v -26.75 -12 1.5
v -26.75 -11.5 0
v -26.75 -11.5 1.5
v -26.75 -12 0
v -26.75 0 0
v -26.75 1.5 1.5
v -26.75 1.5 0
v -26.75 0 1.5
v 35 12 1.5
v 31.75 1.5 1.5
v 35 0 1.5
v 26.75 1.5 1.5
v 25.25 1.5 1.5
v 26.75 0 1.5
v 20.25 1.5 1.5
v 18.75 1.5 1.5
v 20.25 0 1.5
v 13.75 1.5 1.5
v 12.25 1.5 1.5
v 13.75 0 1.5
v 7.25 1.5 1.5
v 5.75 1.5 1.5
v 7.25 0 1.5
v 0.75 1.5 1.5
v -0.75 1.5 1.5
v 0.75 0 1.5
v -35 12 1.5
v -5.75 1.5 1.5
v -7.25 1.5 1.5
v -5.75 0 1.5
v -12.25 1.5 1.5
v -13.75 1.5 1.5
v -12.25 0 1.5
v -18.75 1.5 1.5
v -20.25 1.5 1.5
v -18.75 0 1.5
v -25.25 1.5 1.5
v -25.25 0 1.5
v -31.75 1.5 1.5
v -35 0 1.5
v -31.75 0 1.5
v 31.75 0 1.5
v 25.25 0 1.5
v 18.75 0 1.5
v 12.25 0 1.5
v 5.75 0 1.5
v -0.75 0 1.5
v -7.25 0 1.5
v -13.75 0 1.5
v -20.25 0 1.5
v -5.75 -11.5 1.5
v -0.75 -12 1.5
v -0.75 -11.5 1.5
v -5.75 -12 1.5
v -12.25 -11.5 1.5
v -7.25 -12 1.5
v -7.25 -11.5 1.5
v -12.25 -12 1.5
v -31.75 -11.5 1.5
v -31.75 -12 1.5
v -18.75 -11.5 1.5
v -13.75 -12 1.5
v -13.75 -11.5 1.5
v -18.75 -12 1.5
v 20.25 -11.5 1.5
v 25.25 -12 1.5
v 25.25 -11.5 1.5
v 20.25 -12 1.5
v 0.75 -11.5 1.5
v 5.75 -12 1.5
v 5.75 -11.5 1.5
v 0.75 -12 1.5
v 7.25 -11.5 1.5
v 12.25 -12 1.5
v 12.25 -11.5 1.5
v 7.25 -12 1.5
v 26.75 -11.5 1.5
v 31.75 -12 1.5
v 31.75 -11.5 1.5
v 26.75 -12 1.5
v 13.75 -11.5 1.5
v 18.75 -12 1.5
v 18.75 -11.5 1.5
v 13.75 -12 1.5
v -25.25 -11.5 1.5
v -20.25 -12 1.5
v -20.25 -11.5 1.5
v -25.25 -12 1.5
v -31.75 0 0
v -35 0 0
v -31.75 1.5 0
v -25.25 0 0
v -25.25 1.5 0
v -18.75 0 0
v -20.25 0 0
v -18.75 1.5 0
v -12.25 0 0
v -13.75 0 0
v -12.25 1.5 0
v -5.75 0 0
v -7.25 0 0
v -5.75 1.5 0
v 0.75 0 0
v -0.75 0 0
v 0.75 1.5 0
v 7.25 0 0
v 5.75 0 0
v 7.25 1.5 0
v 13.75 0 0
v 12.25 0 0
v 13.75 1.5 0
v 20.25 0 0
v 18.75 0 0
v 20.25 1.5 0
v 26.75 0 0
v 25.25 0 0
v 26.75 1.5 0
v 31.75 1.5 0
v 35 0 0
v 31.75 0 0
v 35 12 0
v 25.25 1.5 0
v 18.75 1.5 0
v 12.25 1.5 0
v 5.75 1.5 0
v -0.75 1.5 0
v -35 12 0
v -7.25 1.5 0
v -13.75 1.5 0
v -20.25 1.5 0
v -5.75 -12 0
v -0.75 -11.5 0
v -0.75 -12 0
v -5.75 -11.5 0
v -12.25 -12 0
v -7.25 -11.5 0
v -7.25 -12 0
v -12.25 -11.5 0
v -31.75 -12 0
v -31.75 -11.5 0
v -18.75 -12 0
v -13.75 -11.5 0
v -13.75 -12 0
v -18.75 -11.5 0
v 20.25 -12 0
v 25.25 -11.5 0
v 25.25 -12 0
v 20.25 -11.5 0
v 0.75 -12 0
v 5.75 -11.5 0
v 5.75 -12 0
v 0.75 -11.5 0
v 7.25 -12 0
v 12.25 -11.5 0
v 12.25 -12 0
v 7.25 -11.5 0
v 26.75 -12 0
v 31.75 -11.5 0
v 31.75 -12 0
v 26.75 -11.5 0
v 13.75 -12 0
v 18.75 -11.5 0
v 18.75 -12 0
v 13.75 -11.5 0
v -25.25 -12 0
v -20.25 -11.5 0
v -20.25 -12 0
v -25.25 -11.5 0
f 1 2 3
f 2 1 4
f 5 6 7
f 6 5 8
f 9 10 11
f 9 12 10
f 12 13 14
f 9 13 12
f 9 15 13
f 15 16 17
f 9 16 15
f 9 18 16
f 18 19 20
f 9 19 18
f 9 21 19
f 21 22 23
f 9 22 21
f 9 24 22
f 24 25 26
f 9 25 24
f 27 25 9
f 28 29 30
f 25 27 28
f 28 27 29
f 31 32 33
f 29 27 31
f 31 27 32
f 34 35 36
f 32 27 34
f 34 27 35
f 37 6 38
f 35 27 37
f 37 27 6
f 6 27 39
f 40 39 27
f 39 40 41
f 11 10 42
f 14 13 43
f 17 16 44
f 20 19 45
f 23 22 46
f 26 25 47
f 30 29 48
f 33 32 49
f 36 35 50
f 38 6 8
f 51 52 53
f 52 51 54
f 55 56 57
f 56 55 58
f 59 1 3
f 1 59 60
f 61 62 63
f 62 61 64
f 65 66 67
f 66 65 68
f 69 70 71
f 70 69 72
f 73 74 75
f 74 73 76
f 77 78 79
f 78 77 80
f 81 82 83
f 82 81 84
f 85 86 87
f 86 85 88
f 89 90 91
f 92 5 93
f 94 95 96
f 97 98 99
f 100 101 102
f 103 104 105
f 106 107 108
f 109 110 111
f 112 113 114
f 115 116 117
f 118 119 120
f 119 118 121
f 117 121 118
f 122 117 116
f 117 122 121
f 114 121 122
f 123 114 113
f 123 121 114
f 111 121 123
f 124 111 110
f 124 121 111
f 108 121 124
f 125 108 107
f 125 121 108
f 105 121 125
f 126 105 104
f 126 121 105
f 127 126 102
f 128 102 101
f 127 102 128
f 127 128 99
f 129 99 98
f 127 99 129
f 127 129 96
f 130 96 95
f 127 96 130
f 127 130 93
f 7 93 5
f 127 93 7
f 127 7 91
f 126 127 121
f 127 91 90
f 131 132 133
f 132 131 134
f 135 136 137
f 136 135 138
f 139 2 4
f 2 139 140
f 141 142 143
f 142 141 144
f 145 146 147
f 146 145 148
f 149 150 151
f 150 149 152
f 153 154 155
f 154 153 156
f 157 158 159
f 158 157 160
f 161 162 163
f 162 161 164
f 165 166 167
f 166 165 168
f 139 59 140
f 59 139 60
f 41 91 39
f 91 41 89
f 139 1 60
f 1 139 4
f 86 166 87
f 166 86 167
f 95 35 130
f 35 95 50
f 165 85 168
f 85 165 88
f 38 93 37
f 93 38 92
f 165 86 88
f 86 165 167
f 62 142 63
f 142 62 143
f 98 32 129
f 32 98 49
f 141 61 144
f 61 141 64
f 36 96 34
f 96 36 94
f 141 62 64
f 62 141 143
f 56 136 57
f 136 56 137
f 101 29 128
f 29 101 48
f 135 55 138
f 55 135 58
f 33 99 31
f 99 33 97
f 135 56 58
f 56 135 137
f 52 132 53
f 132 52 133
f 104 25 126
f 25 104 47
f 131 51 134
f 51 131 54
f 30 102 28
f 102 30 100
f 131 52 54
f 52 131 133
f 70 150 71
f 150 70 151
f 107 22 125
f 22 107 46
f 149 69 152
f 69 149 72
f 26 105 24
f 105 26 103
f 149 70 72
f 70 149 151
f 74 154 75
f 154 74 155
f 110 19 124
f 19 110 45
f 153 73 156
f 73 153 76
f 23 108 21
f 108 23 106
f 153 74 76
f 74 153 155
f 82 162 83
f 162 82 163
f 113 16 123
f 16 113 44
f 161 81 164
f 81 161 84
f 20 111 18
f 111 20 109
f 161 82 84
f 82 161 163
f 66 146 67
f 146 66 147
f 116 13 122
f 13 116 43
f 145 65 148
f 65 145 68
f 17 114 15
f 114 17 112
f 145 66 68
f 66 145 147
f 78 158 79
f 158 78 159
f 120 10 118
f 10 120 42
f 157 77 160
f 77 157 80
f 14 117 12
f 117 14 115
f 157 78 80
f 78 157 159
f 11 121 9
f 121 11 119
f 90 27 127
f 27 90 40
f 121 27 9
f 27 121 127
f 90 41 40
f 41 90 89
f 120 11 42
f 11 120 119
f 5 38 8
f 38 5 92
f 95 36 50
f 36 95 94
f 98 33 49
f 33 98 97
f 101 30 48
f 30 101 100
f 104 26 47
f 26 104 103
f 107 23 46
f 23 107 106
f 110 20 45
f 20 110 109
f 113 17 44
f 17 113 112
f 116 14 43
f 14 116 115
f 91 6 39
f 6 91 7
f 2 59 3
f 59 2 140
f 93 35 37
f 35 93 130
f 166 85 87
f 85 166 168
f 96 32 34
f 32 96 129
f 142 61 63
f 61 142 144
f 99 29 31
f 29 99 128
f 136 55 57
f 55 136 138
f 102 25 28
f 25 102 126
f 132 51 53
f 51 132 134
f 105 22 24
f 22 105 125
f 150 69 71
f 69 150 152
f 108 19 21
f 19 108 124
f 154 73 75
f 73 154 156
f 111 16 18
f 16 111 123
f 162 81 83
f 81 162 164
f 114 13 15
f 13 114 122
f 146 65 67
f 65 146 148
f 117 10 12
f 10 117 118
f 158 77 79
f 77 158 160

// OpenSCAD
// 10-well agarose gel comb - printed lying flat
// Units: mm

plate_t      = 1.5;   // plate thickness (Z)
spine_len    = 70;    // spine length (X)
spine_w      = 12;    // spine width (Y)
tooth_count  = 10;    // number of teeth
tooth_w      = 5.0;   // tooth width (X)
tooth_l      = 12;    // tooth length (Y, -Y direction)
tooth_h      = 1.5;   // tooth height above plate (Z)
gap          = 1.5;   // gap between teeth (X)
eps          = 0.5;   // cutter overshoot

$fn = 64;

pitch = tooth_w + gap;
x0 = -(tooth_count - 1) * pitch / 2;

difference() {
    union() {
        // spine
        translate([-spine_len / 2, 0, 0])
            cube([spine_len, spine_w, plate_t]);
        // teeth
        for (i = [0 : tooth_count - 1])
            translate([x0 + i * pitch - tooth_w / 2, -tooth_l, 0])
                cube([tooth_w, tooth_l + eps, tooth_h]);
    }
    // wells
    for (i = [0 : tooth_count - 1])
        translate([x0 + i * pitch - tooth_w / 2, -tooth_l + eps, -eps])
            cube([tooth_w, tooth_l + 2 * eps, plate_t + 2 * eps]);
}
